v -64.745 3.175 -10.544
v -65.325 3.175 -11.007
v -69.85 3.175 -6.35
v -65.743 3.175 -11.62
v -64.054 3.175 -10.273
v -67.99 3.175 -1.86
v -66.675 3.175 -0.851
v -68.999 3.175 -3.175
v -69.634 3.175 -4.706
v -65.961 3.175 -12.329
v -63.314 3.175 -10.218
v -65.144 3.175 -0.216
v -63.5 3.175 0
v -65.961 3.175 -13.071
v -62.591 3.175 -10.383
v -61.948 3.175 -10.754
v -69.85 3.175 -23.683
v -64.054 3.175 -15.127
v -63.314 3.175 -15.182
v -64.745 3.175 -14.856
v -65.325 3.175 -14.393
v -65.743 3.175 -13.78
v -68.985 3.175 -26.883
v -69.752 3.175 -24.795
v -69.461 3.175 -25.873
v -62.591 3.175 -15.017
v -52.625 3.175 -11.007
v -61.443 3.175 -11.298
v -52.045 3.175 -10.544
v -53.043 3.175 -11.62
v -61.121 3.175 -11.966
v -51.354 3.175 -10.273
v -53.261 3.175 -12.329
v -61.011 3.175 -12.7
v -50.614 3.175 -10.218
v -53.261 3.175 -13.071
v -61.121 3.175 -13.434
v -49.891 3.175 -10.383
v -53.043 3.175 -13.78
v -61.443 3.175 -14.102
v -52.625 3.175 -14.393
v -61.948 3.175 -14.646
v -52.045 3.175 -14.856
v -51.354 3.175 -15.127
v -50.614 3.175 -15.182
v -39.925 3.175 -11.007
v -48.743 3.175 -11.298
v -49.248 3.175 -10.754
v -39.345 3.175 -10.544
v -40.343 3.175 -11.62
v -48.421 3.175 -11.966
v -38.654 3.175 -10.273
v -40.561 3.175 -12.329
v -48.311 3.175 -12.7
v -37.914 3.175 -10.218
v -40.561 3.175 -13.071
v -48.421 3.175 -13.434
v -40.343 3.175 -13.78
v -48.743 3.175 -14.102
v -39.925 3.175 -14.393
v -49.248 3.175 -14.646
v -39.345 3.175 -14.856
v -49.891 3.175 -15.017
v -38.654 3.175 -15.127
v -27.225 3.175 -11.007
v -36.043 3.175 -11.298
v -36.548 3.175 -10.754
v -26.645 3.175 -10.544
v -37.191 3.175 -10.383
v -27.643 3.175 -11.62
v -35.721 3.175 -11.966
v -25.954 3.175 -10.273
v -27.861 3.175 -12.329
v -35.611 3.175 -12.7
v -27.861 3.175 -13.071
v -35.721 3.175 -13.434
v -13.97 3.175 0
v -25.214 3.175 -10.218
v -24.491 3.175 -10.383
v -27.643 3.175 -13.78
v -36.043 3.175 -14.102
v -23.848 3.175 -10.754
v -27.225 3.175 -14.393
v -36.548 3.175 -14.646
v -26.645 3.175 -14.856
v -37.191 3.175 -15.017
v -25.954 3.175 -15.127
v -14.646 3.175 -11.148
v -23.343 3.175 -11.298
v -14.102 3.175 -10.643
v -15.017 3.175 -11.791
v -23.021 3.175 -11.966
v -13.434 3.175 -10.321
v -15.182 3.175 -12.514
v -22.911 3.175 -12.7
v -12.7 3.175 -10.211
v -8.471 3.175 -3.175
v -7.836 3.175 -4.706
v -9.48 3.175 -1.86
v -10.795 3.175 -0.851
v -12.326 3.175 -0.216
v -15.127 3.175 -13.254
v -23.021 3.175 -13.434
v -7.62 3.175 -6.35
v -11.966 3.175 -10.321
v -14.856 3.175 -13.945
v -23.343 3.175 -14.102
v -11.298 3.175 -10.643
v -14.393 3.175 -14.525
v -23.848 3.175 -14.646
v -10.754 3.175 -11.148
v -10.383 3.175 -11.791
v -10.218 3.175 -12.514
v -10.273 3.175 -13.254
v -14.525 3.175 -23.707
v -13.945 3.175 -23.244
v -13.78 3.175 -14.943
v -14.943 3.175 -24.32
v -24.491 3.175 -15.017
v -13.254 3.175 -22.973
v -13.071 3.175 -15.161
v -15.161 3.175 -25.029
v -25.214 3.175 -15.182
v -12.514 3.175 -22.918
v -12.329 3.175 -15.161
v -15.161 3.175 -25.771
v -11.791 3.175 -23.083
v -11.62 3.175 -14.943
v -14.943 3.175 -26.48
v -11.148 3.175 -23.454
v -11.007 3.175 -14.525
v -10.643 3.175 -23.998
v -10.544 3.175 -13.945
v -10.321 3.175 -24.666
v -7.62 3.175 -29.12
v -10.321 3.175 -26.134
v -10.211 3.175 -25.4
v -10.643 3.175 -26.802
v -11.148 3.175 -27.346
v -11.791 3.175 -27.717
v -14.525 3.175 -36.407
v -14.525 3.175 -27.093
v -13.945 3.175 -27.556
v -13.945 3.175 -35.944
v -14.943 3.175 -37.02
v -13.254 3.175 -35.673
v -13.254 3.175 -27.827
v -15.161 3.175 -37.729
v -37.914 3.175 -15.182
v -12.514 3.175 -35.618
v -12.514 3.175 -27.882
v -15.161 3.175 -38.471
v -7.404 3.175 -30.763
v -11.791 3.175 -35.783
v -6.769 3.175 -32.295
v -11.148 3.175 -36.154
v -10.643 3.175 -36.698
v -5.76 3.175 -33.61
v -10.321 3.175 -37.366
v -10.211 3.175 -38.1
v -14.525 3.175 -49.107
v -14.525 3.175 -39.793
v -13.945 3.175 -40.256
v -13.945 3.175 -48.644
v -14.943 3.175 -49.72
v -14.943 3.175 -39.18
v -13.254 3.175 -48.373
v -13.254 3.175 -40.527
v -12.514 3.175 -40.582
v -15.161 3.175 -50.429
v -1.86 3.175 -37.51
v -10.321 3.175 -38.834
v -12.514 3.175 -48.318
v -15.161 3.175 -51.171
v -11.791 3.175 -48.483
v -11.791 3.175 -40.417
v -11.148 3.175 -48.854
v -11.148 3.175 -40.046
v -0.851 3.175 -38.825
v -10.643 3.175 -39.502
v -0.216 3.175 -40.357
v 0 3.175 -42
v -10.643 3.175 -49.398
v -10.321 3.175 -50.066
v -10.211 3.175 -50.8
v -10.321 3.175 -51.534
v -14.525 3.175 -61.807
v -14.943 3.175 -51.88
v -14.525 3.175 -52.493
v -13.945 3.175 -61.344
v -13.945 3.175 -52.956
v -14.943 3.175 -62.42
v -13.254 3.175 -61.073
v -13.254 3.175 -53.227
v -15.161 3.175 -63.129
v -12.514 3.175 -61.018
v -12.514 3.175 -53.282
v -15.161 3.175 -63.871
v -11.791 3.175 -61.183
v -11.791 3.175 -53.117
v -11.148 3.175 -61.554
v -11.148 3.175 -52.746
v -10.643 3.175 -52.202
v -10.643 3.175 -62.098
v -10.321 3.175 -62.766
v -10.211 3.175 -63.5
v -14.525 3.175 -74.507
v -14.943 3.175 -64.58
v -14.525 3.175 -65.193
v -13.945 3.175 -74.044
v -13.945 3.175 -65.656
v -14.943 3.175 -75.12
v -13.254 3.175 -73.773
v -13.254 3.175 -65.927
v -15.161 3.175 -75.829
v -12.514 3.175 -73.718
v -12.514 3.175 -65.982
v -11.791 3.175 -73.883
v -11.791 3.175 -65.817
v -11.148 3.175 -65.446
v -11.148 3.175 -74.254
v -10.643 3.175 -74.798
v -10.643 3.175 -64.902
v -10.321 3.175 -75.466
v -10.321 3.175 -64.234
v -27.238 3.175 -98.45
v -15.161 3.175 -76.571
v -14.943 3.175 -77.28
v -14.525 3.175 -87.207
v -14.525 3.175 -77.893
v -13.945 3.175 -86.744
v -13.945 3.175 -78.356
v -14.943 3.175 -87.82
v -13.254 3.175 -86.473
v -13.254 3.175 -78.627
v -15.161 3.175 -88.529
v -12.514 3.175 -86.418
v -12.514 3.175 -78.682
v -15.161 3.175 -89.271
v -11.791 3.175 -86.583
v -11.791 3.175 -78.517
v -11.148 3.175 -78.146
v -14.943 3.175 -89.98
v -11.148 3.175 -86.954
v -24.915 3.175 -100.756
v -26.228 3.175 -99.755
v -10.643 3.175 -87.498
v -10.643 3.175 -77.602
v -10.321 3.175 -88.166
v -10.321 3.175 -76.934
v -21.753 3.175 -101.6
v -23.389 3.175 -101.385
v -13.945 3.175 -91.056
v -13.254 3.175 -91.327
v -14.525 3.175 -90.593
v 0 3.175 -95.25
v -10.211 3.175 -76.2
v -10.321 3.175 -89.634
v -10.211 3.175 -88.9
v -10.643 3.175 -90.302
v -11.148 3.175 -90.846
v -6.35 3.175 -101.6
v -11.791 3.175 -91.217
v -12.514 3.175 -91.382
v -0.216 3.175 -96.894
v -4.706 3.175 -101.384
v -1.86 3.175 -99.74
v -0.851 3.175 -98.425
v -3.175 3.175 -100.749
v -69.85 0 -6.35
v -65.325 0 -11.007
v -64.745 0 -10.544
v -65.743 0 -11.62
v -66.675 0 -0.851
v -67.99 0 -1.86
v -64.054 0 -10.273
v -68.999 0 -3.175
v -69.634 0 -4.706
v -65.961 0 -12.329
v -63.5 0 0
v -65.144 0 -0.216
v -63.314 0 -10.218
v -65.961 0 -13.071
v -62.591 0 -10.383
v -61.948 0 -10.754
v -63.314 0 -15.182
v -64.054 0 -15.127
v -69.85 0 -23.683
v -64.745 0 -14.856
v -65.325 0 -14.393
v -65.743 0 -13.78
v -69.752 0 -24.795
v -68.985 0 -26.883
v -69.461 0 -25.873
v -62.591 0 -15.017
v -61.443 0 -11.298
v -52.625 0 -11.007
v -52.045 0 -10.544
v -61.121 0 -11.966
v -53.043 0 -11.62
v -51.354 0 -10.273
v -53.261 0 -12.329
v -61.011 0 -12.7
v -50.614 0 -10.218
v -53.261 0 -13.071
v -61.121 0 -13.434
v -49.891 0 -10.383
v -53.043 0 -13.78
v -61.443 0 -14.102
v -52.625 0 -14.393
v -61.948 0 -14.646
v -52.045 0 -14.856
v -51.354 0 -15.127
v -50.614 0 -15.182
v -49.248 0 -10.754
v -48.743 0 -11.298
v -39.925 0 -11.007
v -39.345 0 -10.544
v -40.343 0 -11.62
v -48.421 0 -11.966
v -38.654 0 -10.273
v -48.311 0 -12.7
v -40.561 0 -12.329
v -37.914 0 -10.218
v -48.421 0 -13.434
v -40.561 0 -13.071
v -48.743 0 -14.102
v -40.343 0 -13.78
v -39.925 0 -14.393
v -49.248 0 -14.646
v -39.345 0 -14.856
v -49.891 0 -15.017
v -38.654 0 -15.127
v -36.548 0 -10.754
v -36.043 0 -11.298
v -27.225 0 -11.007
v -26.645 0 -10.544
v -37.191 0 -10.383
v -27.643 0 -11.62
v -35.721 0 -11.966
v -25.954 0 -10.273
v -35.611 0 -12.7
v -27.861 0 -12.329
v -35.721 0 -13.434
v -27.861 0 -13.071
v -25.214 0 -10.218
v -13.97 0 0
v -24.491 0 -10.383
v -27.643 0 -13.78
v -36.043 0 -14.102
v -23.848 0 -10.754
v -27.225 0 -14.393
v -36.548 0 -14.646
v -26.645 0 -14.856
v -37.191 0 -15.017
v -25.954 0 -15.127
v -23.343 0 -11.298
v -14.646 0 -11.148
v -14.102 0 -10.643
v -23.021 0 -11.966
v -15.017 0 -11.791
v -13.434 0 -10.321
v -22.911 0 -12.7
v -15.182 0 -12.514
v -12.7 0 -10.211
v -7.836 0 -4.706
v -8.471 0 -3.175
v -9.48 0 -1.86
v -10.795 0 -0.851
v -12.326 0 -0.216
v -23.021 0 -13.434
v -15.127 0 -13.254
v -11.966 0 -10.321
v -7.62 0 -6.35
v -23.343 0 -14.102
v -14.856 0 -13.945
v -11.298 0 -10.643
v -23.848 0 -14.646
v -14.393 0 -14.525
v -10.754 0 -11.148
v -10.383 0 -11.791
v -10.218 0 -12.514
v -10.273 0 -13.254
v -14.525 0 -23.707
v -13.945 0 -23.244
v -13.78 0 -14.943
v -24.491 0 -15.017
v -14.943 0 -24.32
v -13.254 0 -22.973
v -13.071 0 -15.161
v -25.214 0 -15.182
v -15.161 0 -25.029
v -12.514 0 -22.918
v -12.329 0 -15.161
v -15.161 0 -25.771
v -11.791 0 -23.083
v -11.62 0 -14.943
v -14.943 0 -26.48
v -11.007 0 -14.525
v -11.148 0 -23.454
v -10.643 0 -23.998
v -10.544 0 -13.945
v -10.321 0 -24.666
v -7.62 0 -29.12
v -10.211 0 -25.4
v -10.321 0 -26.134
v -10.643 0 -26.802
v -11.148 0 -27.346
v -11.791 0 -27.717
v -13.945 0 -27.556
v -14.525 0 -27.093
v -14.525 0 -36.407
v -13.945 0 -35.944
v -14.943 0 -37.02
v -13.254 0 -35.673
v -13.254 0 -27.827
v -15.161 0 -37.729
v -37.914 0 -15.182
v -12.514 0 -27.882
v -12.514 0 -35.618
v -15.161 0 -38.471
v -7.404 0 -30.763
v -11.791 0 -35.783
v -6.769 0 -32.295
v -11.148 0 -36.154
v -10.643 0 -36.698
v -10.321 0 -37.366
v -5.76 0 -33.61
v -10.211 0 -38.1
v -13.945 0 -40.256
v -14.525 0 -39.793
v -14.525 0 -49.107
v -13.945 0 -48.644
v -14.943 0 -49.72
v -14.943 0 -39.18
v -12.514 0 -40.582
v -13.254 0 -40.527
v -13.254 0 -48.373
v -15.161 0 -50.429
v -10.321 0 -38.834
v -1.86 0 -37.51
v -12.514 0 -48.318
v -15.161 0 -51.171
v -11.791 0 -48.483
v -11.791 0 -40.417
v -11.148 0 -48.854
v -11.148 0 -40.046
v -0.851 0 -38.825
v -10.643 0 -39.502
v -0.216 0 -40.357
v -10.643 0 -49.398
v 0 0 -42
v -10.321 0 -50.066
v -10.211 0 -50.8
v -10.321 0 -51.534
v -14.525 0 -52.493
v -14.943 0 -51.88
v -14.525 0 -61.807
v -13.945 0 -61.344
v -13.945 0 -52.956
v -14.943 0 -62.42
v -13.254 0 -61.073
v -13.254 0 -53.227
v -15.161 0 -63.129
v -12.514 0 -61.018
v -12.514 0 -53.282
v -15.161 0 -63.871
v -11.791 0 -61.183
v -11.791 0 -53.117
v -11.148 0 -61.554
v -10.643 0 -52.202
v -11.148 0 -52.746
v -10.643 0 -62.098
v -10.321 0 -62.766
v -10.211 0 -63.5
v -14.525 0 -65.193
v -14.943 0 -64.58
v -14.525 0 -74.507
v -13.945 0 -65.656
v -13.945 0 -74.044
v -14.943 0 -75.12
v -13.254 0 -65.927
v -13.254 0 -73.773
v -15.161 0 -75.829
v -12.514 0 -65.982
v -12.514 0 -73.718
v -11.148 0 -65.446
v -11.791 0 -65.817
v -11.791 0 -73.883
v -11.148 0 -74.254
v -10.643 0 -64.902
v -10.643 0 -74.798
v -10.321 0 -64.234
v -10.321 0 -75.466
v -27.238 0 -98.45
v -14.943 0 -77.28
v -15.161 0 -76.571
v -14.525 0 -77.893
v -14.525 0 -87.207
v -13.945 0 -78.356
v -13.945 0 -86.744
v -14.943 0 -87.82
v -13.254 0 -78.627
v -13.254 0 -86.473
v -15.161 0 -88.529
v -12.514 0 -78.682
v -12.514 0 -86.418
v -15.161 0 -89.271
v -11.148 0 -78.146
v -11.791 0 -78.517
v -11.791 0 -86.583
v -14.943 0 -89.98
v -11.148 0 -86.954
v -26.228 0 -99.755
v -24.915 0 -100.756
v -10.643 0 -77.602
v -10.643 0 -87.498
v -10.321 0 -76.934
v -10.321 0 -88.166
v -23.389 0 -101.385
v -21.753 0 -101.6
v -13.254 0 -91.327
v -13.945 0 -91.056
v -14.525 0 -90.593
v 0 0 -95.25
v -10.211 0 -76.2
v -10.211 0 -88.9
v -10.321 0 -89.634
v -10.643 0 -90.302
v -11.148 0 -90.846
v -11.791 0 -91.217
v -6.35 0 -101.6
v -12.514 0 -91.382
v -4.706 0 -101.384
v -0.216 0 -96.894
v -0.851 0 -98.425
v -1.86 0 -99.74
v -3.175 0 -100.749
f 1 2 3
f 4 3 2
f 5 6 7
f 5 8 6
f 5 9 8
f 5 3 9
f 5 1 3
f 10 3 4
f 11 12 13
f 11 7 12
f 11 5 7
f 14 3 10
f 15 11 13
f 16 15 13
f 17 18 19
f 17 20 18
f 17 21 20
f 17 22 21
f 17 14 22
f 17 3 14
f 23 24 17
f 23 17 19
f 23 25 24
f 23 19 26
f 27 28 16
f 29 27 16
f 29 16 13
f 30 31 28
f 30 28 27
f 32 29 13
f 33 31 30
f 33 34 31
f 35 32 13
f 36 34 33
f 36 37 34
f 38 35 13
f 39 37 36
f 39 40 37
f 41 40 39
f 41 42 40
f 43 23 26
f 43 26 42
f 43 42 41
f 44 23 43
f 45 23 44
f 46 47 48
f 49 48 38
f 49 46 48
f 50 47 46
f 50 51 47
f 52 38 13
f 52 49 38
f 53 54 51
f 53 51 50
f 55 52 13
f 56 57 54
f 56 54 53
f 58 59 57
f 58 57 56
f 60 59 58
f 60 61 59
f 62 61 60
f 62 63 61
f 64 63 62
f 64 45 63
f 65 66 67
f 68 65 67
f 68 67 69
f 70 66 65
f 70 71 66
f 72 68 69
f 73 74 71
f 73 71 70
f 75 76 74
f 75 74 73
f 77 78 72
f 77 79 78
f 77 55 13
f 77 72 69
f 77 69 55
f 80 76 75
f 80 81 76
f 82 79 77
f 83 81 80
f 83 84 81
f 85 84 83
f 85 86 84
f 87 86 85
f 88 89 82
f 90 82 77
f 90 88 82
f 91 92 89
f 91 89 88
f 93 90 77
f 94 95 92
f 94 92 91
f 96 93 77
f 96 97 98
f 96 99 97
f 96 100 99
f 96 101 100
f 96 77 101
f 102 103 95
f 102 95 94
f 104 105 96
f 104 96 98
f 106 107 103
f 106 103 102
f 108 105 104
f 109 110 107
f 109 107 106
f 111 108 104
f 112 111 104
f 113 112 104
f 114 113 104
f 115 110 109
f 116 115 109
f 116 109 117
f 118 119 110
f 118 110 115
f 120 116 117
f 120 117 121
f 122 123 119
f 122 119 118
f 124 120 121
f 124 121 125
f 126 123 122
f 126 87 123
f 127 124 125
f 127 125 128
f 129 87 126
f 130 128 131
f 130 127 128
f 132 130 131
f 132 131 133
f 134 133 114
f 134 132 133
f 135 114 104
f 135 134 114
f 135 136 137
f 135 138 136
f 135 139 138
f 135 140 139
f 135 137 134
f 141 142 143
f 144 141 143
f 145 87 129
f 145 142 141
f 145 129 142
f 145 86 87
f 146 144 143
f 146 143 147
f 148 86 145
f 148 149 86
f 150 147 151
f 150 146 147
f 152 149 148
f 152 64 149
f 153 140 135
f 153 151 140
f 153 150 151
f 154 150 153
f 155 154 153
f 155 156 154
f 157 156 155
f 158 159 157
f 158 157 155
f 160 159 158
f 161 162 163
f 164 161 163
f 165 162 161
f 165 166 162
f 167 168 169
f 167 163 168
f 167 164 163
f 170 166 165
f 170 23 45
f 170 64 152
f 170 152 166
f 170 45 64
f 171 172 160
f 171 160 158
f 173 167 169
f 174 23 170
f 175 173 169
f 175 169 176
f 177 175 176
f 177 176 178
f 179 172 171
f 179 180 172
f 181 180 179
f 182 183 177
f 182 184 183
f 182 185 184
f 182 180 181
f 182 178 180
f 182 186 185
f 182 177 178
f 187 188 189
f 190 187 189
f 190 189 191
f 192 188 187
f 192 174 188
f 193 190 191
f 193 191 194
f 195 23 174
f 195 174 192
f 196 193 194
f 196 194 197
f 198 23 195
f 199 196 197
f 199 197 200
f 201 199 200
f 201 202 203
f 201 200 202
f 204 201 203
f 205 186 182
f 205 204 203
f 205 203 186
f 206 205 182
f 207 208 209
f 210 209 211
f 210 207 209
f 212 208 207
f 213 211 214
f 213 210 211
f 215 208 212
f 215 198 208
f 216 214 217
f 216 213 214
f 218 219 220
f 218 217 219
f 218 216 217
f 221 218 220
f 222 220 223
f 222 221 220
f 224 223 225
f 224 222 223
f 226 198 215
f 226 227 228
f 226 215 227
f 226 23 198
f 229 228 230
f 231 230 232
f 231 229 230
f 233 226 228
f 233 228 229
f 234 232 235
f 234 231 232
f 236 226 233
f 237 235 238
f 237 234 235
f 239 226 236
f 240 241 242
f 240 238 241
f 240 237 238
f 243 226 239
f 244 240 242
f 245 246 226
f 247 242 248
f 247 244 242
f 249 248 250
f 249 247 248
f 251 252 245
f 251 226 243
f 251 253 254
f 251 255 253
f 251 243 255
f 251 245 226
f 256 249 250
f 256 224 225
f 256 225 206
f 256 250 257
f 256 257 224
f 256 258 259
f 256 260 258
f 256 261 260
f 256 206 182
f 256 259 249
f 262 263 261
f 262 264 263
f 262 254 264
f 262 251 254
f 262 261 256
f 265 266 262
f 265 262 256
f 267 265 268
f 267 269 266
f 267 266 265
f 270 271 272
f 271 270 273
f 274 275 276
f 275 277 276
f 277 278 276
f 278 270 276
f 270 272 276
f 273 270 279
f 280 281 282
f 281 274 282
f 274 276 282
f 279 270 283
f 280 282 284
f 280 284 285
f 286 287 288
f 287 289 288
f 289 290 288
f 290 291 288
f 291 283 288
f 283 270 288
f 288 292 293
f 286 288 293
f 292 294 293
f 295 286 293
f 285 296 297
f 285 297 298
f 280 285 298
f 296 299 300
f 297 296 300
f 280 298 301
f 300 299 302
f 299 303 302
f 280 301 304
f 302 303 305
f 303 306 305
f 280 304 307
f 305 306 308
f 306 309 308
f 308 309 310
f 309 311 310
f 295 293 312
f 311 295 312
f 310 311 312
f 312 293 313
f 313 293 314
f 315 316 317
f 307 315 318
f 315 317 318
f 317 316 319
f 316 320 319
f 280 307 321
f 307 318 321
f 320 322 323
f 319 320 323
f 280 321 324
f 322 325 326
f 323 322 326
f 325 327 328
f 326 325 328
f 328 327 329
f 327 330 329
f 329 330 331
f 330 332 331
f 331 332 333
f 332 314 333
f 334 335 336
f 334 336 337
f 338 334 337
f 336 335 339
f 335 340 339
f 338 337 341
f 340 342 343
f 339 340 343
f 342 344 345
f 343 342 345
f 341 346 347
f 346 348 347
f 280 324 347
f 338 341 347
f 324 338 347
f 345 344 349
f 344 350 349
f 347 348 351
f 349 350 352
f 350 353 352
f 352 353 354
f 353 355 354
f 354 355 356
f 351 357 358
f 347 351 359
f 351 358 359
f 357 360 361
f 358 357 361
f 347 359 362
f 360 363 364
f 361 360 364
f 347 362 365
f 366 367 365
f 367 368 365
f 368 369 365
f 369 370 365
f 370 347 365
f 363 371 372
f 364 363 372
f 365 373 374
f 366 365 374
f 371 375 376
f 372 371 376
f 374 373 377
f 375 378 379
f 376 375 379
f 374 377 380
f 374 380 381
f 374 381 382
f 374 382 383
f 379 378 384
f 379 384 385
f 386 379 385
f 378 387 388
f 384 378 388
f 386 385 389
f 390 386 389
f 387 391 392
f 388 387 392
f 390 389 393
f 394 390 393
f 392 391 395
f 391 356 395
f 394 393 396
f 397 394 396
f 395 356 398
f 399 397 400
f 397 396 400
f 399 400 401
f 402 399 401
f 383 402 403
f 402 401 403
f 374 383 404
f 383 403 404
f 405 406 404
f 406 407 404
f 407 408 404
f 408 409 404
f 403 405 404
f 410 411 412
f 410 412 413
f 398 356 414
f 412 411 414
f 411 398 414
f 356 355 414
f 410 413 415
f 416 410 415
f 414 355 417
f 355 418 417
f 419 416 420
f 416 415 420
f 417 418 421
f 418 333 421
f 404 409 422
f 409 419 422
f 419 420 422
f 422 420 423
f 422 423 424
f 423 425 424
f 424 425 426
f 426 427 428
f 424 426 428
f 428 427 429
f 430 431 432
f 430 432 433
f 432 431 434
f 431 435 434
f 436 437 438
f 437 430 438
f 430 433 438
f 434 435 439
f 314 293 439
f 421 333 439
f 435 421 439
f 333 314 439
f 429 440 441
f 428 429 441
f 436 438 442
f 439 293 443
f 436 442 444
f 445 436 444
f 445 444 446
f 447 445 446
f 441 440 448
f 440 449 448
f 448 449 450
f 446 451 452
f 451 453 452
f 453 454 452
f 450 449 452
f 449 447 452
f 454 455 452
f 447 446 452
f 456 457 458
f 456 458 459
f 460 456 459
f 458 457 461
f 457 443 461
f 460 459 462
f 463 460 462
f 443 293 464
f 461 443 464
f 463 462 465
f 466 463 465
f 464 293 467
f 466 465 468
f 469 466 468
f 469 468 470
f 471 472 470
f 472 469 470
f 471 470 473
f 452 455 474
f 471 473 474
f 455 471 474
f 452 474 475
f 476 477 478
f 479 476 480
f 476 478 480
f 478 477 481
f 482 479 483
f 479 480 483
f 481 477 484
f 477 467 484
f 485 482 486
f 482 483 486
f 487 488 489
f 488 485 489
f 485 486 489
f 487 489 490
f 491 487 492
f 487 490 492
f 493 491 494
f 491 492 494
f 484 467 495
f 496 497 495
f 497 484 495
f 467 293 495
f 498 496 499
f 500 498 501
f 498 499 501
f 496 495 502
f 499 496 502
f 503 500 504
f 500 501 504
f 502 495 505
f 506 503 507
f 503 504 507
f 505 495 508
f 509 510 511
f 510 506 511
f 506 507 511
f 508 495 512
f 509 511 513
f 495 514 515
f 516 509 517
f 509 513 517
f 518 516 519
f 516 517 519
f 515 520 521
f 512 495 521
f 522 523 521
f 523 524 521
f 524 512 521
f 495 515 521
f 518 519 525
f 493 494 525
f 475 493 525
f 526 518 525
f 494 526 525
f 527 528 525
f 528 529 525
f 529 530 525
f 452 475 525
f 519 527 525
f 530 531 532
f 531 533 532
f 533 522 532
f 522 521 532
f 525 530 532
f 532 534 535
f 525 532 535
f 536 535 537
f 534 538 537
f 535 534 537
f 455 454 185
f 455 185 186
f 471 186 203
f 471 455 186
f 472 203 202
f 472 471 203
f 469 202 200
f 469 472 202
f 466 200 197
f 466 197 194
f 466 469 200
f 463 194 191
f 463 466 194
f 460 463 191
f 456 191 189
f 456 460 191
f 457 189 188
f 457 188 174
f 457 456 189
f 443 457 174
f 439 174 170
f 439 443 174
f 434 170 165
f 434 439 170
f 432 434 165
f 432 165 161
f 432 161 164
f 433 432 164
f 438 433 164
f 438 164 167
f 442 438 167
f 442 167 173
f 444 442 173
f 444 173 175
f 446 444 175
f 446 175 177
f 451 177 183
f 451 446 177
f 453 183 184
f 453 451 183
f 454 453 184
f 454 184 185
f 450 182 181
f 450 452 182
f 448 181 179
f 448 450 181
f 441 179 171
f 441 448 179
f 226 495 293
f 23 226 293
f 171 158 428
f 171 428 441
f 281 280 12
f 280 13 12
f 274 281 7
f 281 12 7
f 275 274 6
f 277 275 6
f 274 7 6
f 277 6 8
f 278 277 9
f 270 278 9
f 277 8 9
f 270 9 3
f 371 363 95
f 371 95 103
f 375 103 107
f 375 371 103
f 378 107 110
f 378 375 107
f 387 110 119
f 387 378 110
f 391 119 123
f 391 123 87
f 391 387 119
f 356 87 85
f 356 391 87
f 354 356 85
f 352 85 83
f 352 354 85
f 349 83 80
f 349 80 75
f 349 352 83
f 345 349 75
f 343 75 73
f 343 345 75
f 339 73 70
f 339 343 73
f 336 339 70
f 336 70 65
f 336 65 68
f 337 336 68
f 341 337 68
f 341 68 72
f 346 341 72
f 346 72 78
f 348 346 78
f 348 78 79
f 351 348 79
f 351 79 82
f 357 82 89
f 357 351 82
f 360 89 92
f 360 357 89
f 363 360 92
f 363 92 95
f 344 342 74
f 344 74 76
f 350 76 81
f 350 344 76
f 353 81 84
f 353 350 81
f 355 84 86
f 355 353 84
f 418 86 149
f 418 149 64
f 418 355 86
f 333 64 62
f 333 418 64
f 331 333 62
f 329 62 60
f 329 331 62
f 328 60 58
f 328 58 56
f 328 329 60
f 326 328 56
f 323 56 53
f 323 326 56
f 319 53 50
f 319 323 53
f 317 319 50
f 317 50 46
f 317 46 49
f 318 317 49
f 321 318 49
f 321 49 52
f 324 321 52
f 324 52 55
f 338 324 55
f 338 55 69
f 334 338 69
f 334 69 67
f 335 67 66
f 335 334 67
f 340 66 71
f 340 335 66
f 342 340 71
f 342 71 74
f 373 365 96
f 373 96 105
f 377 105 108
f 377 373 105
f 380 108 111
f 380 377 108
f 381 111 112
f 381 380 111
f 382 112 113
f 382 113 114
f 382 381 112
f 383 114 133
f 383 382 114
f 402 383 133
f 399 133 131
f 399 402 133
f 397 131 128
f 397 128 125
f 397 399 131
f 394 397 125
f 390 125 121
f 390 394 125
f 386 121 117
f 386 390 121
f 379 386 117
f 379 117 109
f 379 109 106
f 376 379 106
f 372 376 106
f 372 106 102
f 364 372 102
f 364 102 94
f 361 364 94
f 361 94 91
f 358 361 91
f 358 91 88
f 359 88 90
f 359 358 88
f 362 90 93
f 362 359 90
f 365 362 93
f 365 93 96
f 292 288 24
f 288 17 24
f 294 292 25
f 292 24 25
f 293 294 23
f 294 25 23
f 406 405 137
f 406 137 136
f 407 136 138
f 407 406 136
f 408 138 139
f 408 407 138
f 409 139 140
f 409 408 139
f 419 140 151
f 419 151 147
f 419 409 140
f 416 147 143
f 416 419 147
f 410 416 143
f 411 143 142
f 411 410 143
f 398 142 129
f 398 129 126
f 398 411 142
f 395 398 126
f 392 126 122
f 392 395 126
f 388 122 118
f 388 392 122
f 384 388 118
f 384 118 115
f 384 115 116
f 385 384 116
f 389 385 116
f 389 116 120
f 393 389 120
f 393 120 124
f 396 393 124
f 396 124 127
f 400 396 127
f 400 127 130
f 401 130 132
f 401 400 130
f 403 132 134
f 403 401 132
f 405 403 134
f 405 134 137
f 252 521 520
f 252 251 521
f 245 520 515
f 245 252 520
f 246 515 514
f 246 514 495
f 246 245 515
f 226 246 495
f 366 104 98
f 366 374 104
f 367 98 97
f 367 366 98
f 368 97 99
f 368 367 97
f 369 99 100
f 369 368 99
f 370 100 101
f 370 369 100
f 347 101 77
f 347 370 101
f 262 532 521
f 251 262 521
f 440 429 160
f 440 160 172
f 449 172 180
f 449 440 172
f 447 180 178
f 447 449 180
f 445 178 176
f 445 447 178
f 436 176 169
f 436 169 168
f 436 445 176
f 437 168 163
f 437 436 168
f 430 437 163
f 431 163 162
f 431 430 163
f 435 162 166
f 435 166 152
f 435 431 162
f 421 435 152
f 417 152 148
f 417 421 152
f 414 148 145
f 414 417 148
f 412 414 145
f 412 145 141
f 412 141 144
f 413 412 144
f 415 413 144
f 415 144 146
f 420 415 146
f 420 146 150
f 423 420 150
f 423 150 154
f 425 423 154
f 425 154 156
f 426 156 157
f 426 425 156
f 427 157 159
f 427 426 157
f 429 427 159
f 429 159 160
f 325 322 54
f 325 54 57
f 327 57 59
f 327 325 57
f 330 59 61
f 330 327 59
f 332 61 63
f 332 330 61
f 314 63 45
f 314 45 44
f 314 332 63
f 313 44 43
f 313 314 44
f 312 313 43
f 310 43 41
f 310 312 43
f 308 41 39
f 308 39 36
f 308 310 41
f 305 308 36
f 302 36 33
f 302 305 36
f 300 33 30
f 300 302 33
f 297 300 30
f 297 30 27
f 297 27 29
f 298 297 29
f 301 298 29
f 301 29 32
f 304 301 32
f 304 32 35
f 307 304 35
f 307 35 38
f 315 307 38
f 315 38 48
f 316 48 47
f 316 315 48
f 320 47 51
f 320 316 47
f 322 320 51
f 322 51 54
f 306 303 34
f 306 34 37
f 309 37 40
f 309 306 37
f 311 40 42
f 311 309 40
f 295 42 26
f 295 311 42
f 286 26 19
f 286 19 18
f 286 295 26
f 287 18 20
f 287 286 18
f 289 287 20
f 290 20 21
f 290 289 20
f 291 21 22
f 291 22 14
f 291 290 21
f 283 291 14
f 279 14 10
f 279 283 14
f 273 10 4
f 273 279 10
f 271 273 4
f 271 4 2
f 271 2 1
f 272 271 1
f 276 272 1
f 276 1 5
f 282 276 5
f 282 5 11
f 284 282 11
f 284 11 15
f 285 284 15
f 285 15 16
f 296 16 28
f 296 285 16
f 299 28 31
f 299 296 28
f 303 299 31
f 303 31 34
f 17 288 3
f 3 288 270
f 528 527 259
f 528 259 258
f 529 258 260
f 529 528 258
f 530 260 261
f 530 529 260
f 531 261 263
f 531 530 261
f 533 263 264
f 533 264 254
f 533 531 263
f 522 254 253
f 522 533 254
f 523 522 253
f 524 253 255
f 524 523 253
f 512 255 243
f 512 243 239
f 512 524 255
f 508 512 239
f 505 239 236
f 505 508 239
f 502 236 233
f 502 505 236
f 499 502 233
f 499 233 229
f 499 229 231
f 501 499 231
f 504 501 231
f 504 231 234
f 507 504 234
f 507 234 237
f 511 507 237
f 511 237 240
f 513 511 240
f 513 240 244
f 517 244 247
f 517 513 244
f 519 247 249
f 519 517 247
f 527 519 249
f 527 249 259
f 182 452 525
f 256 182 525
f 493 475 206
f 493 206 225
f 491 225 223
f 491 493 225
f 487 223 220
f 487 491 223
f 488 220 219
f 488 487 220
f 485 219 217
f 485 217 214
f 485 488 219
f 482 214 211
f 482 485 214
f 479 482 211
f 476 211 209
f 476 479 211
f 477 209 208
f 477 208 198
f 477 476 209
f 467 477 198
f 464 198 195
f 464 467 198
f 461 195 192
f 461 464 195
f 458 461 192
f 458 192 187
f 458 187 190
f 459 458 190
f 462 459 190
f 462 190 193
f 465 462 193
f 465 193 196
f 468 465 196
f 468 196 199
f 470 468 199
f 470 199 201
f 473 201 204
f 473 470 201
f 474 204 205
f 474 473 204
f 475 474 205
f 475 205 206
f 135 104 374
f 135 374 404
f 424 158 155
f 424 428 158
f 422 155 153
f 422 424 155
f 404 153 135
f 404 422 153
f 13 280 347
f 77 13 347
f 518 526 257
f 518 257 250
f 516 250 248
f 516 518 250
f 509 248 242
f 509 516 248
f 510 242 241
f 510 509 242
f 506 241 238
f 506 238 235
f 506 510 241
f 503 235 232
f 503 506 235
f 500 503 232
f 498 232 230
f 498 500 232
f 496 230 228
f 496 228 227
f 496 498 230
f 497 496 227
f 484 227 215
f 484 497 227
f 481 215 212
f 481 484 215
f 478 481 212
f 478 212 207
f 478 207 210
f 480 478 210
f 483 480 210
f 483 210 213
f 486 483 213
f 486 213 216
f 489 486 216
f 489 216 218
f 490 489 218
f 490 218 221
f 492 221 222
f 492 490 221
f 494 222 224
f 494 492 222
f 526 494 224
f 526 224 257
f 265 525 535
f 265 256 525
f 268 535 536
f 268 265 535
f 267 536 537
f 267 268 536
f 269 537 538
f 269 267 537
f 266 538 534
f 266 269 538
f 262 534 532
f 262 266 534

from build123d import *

# Parameters (mm, degrees)
SKETCH2_R           = 2.4892
BOSS_EXTRUDE1_DEPTH = 3.175
LPATTERN1_OUTLINE_R = 2.4892
LPATTERN1_DEPTH     = 3.175
CUT_EXTRUDE1_DEPTH  = 124.335571207
FILLET2_R           = 6.35


# Read off the part's stored shape, not the designer's step: LPattern1
with BuildPart() as part:
    # Sketch2 → Boss-Extrude1 (new body)
    with BuildSketch(Plane(origin=(0, 0, 0), x_dir=(1, 0, 0), z_dir=(0, 1, 0))):
        Polygon((0, 0), (0, 101.6), (-25.4, 101.6), (-69.85, 25.4), (-69.85, 0), align=None)
        with Locations(Location((-12.7, 12.7, 0), (0, 0, 270))):
            Circle(SKETCH2_R, mode=Mode.SUBTRACT)
    extrude(amount=BOSS_EXTRUDE1_DEPTH)

    # LPattern1 outline → LPattern1 (cut)
    with BuildSketch(Plane(origin=(0, 0, 0), x_dir=(1, 0, 0), z_dir=(0, 1, 0))):
        with Locations((-63.5, 12.7)):
            Circle(LPATTERN1_OUTLINE_R)
        with Locations((-50.8, 12.7)):
            Circle(LPATTERN1_OUTLINE_R)
        with Locations((-38.1, 12.7)):
            Circle(LPATTERN1_OUTLINE_R)
        with Locations((-25.4, 12.7)):
            Circle(LPATTERN1_OUTLINE_R)
        with Locations((-12.7, 88.9)):
            Circle(LPATTERN1_OUTLINE_R)
        with Locations((-12.7, 76.2)):
            Circle(LPATTERN1_OUTLINE_R)
        with Locations((-12.7, 63.5)):
            Circle(LPATTERN1_OUTLINE_R)
        with Locations((-12.7, 50.8)):
            Circle(LPATTERN1_OUTLINE_R)
        with Locations((-12.7, 38.1)):
            Circle(LPATTERN1_OUTLINE_R)
        with Locations((-12.7, 25.4)):
            Circle(LPATTERN1_OUTLINE_R)
    extrude(amount=LPATTERN1_DEPTH, mode=Mode.SUBTRACT)

    # Sketch3 → Cut-Extrude1 (cut, through all)
    with BuildSketch(Plane(origin=(0, 3.175, 0), x_dir=(1, 0, 0), z_dir=(0, 1, 0))):
        Polygon((-7.62, 31.75), (0, 39.37), (0, 31.75), (0, 0), (-7.62, 0), align=None)
    extrude(amount=-CUT_EXTRUDE1_DEPTH, mode=Mode.SUBTRACT)

    # Fillet2
    fillet2_edges = [part.edges().sort_by_distance(p)[0] for p in [
        (-7.62, 1.5875, 0),
        (-7.62, 1.5875, -31.75),
        (0, 1.5875, -39.37),
        (-69.85, 1.5875, 0),
        (-69.85, 1.5875, -25.4),
        (-25.4, 1.5875, -101.6),
        (0, 1.5875, -101.6),
    ]]
    fillet(fillet2_edges, radius=FILLET2_R)


solid = part.part
